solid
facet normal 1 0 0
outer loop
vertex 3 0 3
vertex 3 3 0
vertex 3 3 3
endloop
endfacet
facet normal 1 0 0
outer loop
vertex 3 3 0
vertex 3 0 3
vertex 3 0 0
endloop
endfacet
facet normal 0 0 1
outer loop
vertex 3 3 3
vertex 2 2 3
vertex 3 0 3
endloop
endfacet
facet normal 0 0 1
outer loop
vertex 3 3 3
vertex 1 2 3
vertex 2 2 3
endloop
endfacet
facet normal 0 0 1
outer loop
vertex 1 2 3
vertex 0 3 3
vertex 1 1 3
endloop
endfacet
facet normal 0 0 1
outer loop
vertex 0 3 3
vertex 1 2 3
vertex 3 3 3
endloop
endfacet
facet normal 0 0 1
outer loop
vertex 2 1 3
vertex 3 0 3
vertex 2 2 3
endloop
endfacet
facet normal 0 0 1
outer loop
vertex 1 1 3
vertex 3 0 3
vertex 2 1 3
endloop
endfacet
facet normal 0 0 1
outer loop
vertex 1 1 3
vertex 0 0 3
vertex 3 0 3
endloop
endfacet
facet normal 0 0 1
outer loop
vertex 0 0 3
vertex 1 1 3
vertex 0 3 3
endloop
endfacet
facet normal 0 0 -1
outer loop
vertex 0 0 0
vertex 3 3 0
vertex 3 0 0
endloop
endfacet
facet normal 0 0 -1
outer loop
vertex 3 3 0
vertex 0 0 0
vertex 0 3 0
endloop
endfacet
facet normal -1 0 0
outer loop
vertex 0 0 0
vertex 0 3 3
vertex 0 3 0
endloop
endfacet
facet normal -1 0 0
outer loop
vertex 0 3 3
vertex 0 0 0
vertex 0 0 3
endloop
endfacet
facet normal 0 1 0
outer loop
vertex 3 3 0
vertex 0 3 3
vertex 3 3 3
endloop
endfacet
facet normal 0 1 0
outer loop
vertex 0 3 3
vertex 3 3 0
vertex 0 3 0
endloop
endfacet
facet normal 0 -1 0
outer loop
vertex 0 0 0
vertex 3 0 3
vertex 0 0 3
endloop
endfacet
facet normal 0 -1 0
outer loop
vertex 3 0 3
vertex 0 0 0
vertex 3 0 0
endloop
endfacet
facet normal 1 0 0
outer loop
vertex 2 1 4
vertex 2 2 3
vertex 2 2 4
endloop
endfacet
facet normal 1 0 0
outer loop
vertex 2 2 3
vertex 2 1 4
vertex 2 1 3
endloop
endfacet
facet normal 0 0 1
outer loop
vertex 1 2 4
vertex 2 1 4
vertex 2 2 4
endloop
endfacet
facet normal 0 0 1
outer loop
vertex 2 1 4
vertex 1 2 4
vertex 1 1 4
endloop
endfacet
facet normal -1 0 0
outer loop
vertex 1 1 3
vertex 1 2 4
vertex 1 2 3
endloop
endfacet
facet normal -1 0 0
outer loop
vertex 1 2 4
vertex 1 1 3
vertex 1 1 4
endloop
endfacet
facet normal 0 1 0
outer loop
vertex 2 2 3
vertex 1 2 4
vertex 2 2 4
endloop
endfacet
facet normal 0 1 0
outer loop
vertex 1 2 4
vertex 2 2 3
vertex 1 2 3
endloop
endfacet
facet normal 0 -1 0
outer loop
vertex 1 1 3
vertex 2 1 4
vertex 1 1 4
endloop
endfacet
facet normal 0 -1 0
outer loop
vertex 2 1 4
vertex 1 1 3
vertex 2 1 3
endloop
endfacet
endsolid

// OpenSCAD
union() {
    cube(3);
    translate([1, 1, 2]) {
        cube([1, 1, 2]);
    }
}
